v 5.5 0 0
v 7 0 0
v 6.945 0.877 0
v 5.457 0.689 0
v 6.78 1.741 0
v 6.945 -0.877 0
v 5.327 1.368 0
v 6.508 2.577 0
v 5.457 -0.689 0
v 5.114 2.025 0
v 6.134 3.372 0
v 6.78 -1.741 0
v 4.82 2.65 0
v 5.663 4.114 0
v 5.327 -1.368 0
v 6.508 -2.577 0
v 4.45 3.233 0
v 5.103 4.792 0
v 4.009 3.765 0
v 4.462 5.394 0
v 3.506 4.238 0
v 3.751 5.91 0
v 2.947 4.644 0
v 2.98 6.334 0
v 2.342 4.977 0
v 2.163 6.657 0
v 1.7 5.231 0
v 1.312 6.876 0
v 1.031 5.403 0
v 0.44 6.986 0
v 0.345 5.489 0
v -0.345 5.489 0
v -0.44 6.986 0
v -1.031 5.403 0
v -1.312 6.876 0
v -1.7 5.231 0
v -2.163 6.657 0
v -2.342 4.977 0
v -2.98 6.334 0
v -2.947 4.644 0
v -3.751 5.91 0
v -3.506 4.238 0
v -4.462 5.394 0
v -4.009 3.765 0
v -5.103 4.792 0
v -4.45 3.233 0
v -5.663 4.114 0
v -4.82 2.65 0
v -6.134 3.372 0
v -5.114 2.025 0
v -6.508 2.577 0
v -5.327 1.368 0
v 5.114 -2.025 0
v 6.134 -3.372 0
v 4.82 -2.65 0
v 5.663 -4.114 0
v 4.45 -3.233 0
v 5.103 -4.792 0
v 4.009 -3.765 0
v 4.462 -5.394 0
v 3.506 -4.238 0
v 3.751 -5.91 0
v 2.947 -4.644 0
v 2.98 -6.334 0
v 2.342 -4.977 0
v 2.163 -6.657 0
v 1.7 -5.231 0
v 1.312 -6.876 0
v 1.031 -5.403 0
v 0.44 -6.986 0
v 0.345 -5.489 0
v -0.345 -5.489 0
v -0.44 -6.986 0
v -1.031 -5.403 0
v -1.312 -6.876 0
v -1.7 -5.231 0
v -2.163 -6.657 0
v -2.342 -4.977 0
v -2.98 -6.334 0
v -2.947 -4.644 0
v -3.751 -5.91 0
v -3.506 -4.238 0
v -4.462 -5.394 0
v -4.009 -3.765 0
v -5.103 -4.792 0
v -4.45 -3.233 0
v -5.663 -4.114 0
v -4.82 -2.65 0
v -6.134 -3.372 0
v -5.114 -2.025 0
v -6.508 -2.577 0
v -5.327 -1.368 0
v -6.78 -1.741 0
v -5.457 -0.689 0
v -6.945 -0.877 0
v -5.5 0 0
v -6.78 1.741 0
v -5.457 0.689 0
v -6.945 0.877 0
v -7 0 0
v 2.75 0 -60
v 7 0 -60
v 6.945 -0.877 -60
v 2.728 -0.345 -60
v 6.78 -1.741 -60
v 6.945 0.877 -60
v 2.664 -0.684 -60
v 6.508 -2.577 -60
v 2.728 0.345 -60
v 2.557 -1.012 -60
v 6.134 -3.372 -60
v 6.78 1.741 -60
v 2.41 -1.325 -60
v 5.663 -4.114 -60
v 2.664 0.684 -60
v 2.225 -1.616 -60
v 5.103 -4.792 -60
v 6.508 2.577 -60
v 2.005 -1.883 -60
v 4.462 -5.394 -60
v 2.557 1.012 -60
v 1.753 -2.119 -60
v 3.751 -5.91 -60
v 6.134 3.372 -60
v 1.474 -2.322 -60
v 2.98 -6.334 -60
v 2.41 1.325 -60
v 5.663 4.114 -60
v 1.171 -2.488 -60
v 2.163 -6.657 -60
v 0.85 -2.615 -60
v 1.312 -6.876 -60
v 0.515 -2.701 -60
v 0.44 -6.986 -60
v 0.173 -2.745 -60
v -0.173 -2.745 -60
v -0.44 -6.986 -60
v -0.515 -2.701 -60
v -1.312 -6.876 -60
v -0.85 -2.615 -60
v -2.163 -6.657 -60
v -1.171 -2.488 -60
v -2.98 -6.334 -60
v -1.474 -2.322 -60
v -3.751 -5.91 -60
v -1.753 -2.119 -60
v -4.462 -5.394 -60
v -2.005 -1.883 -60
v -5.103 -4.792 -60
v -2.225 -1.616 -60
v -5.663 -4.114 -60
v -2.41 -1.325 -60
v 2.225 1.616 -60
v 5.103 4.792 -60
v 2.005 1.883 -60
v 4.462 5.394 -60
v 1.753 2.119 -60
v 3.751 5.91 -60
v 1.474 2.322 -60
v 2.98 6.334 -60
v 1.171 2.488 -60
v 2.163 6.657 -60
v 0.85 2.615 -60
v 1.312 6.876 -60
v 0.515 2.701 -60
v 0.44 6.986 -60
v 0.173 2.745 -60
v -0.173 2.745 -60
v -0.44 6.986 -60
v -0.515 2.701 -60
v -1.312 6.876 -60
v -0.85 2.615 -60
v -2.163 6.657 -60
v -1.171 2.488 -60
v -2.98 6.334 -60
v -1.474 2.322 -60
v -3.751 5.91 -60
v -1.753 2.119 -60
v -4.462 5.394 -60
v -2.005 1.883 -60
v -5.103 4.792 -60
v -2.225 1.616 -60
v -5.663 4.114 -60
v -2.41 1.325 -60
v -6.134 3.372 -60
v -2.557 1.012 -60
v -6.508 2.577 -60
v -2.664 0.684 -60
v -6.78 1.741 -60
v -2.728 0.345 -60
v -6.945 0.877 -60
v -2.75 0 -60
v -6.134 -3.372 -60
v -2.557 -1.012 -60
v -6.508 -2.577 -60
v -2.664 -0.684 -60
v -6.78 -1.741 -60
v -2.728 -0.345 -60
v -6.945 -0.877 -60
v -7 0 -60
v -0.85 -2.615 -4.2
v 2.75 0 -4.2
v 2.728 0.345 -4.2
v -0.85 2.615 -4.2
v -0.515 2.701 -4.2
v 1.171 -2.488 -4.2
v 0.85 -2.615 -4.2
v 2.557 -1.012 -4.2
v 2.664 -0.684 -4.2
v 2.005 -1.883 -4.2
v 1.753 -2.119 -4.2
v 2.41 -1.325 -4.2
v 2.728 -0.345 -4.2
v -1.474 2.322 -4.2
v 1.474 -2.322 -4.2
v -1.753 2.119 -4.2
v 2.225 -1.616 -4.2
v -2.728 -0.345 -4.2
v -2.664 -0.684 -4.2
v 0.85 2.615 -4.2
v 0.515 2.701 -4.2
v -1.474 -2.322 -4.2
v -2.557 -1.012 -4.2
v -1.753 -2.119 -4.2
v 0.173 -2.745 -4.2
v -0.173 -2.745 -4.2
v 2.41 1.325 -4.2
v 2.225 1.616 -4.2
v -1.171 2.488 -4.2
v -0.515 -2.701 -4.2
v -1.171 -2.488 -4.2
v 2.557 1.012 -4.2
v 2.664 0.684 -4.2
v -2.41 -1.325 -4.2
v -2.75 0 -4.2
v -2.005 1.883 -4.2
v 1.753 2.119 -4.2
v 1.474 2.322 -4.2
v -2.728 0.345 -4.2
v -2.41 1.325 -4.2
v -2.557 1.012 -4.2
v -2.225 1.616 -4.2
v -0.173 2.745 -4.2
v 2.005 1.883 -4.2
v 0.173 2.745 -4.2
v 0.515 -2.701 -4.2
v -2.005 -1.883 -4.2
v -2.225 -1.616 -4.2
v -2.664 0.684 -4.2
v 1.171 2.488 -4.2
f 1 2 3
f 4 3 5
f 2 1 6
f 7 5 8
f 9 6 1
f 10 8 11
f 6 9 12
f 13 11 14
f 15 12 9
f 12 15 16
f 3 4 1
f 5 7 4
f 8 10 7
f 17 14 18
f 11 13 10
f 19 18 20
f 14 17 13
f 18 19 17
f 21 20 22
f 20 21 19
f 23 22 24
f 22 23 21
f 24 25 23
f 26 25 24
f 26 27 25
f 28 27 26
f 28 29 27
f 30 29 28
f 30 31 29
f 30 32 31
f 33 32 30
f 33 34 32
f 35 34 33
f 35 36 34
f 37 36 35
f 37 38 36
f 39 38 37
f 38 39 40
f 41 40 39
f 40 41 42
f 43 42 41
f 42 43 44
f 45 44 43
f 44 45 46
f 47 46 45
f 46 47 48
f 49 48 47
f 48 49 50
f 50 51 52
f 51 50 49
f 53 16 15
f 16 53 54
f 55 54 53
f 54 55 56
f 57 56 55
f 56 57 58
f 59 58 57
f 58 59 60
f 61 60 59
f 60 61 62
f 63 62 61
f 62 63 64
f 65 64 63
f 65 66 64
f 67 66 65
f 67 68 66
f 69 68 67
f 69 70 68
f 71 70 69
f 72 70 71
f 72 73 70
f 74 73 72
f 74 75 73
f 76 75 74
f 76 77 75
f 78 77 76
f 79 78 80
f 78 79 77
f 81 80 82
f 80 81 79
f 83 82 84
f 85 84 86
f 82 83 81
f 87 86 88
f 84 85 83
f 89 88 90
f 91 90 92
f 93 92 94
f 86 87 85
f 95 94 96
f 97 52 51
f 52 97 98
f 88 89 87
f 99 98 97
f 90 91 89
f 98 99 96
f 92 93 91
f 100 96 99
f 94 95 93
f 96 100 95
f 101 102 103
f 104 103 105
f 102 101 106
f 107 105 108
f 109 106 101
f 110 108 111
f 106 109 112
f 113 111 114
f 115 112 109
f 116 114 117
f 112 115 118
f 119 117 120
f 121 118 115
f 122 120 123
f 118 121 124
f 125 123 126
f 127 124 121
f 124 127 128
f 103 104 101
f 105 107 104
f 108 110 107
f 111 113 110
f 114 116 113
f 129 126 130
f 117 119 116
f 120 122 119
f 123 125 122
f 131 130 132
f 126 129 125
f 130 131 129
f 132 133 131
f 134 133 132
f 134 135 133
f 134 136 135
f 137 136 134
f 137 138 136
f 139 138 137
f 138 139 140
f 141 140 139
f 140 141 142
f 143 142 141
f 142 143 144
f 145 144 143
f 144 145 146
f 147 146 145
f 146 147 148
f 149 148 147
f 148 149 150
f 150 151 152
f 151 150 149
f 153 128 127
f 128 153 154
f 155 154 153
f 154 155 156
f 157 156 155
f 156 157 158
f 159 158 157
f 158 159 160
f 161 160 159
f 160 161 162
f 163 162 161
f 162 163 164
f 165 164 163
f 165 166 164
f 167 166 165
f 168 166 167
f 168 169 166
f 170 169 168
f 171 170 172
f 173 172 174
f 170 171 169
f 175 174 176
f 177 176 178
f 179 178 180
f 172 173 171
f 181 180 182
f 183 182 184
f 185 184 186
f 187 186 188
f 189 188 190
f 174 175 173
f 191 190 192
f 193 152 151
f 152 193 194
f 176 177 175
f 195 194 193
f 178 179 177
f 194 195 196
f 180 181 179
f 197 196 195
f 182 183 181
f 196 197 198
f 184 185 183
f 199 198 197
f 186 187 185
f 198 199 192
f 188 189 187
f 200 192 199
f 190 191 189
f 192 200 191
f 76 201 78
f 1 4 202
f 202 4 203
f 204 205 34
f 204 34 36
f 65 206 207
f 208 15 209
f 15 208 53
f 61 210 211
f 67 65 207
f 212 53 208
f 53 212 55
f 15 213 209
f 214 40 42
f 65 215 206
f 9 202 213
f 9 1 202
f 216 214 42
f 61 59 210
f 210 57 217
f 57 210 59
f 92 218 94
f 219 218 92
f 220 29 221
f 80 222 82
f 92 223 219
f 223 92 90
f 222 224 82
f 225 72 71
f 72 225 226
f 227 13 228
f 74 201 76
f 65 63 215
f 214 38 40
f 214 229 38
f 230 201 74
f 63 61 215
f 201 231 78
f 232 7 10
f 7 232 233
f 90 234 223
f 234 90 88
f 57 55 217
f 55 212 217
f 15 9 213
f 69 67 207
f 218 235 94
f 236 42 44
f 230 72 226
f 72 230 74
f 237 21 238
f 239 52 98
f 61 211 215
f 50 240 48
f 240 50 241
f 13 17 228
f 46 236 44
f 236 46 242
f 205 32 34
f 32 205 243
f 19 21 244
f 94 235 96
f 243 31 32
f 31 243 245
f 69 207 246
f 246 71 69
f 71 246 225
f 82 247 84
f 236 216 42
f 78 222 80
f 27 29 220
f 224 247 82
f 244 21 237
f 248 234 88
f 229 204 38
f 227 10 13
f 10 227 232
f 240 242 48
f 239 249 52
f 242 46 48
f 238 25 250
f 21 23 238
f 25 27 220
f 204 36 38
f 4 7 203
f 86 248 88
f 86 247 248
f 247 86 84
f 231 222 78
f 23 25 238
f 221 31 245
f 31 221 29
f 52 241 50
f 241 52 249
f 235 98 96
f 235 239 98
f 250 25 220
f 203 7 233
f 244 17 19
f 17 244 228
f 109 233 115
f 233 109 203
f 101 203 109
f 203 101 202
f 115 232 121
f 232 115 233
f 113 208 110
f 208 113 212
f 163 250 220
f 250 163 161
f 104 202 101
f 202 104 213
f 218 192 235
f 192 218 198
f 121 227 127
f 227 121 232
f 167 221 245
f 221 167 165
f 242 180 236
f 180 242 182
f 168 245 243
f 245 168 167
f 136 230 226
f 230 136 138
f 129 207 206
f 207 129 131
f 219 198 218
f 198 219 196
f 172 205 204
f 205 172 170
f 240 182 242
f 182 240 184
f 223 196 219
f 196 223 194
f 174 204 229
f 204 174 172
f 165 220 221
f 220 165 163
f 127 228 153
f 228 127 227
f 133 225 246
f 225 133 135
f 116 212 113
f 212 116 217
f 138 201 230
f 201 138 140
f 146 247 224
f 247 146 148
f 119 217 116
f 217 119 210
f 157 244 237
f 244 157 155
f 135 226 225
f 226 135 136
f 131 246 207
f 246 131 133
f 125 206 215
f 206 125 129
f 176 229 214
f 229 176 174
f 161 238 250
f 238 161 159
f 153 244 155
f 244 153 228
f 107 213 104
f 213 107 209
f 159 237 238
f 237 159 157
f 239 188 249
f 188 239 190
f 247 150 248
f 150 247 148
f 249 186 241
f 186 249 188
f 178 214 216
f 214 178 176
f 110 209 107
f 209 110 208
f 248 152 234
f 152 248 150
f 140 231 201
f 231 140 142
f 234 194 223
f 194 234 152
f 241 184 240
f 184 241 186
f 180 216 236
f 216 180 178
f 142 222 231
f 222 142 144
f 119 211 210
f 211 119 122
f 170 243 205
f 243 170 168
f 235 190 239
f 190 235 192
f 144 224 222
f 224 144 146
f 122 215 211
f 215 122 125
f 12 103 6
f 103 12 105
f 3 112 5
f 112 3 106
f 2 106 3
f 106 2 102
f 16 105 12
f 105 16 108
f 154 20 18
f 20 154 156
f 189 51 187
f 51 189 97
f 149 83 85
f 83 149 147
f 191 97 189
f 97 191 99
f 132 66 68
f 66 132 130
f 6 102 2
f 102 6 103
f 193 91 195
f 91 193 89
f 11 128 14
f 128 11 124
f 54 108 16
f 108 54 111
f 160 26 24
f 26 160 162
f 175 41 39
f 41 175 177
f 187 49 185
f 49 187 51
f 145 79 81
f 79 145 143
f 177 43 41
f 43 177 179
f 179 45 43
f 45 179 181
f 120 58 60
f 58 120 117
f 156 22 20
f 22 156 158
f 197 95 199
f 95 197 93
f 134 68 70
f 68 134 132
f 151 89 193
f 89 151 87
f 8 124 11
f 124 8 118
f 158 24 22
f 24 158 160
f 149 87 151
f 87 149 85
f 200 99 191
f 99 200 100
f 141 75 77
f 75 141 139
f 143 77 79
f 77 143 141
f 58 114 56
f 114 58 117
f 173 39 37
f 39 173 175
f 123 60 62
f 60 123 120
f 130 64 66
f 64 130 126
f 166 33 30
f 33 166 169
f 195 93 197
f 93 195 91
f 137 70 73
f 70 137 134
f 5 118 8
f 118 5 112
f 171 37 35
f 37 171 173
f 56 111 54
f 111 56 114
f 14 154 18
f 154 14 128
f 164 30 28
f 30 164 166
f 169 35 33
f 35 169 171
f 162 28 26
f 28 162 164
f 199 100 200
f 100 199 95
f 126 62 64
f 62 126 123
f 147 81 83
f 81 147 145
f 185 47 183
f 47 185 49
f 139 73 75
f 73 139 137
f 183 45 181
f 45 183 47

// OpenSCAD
$fn = 50;


difference() {
	union() {
		translate(v = [0, 0, -60.0000000000]) {
			cylinder(h = 60, r = 7.0000000000);
		}
		cylinder(h = 0, r = 17.0000000000);
	}
	union() {
		translate(v = [0, 0, 0]) {
			rotate(a = [0, 0, 0]) {
				difference() {
					union() {
						#translate(v = [0, 0, -60.0000000000]) {
							cylinder(h = 60, r = 2.2500000000);
						}
						#translate(v = [0, 0, -4.2000000000]) {
							cylinder(h = 4.2000000000, r1 = 2.7500000000, r2 = 5.5000000000);
						}
						#translate(v = [0, 0, -60.0000000000]) {
							cylinder(h = 60, r = 2.7500000000);
						}
						#translate(v = [0, 0, -60.0000000000]) {
							cylinder(h = 60, r = 2.2500000000);
						}
					}
					union();
				}
			}
		}
	}
}
